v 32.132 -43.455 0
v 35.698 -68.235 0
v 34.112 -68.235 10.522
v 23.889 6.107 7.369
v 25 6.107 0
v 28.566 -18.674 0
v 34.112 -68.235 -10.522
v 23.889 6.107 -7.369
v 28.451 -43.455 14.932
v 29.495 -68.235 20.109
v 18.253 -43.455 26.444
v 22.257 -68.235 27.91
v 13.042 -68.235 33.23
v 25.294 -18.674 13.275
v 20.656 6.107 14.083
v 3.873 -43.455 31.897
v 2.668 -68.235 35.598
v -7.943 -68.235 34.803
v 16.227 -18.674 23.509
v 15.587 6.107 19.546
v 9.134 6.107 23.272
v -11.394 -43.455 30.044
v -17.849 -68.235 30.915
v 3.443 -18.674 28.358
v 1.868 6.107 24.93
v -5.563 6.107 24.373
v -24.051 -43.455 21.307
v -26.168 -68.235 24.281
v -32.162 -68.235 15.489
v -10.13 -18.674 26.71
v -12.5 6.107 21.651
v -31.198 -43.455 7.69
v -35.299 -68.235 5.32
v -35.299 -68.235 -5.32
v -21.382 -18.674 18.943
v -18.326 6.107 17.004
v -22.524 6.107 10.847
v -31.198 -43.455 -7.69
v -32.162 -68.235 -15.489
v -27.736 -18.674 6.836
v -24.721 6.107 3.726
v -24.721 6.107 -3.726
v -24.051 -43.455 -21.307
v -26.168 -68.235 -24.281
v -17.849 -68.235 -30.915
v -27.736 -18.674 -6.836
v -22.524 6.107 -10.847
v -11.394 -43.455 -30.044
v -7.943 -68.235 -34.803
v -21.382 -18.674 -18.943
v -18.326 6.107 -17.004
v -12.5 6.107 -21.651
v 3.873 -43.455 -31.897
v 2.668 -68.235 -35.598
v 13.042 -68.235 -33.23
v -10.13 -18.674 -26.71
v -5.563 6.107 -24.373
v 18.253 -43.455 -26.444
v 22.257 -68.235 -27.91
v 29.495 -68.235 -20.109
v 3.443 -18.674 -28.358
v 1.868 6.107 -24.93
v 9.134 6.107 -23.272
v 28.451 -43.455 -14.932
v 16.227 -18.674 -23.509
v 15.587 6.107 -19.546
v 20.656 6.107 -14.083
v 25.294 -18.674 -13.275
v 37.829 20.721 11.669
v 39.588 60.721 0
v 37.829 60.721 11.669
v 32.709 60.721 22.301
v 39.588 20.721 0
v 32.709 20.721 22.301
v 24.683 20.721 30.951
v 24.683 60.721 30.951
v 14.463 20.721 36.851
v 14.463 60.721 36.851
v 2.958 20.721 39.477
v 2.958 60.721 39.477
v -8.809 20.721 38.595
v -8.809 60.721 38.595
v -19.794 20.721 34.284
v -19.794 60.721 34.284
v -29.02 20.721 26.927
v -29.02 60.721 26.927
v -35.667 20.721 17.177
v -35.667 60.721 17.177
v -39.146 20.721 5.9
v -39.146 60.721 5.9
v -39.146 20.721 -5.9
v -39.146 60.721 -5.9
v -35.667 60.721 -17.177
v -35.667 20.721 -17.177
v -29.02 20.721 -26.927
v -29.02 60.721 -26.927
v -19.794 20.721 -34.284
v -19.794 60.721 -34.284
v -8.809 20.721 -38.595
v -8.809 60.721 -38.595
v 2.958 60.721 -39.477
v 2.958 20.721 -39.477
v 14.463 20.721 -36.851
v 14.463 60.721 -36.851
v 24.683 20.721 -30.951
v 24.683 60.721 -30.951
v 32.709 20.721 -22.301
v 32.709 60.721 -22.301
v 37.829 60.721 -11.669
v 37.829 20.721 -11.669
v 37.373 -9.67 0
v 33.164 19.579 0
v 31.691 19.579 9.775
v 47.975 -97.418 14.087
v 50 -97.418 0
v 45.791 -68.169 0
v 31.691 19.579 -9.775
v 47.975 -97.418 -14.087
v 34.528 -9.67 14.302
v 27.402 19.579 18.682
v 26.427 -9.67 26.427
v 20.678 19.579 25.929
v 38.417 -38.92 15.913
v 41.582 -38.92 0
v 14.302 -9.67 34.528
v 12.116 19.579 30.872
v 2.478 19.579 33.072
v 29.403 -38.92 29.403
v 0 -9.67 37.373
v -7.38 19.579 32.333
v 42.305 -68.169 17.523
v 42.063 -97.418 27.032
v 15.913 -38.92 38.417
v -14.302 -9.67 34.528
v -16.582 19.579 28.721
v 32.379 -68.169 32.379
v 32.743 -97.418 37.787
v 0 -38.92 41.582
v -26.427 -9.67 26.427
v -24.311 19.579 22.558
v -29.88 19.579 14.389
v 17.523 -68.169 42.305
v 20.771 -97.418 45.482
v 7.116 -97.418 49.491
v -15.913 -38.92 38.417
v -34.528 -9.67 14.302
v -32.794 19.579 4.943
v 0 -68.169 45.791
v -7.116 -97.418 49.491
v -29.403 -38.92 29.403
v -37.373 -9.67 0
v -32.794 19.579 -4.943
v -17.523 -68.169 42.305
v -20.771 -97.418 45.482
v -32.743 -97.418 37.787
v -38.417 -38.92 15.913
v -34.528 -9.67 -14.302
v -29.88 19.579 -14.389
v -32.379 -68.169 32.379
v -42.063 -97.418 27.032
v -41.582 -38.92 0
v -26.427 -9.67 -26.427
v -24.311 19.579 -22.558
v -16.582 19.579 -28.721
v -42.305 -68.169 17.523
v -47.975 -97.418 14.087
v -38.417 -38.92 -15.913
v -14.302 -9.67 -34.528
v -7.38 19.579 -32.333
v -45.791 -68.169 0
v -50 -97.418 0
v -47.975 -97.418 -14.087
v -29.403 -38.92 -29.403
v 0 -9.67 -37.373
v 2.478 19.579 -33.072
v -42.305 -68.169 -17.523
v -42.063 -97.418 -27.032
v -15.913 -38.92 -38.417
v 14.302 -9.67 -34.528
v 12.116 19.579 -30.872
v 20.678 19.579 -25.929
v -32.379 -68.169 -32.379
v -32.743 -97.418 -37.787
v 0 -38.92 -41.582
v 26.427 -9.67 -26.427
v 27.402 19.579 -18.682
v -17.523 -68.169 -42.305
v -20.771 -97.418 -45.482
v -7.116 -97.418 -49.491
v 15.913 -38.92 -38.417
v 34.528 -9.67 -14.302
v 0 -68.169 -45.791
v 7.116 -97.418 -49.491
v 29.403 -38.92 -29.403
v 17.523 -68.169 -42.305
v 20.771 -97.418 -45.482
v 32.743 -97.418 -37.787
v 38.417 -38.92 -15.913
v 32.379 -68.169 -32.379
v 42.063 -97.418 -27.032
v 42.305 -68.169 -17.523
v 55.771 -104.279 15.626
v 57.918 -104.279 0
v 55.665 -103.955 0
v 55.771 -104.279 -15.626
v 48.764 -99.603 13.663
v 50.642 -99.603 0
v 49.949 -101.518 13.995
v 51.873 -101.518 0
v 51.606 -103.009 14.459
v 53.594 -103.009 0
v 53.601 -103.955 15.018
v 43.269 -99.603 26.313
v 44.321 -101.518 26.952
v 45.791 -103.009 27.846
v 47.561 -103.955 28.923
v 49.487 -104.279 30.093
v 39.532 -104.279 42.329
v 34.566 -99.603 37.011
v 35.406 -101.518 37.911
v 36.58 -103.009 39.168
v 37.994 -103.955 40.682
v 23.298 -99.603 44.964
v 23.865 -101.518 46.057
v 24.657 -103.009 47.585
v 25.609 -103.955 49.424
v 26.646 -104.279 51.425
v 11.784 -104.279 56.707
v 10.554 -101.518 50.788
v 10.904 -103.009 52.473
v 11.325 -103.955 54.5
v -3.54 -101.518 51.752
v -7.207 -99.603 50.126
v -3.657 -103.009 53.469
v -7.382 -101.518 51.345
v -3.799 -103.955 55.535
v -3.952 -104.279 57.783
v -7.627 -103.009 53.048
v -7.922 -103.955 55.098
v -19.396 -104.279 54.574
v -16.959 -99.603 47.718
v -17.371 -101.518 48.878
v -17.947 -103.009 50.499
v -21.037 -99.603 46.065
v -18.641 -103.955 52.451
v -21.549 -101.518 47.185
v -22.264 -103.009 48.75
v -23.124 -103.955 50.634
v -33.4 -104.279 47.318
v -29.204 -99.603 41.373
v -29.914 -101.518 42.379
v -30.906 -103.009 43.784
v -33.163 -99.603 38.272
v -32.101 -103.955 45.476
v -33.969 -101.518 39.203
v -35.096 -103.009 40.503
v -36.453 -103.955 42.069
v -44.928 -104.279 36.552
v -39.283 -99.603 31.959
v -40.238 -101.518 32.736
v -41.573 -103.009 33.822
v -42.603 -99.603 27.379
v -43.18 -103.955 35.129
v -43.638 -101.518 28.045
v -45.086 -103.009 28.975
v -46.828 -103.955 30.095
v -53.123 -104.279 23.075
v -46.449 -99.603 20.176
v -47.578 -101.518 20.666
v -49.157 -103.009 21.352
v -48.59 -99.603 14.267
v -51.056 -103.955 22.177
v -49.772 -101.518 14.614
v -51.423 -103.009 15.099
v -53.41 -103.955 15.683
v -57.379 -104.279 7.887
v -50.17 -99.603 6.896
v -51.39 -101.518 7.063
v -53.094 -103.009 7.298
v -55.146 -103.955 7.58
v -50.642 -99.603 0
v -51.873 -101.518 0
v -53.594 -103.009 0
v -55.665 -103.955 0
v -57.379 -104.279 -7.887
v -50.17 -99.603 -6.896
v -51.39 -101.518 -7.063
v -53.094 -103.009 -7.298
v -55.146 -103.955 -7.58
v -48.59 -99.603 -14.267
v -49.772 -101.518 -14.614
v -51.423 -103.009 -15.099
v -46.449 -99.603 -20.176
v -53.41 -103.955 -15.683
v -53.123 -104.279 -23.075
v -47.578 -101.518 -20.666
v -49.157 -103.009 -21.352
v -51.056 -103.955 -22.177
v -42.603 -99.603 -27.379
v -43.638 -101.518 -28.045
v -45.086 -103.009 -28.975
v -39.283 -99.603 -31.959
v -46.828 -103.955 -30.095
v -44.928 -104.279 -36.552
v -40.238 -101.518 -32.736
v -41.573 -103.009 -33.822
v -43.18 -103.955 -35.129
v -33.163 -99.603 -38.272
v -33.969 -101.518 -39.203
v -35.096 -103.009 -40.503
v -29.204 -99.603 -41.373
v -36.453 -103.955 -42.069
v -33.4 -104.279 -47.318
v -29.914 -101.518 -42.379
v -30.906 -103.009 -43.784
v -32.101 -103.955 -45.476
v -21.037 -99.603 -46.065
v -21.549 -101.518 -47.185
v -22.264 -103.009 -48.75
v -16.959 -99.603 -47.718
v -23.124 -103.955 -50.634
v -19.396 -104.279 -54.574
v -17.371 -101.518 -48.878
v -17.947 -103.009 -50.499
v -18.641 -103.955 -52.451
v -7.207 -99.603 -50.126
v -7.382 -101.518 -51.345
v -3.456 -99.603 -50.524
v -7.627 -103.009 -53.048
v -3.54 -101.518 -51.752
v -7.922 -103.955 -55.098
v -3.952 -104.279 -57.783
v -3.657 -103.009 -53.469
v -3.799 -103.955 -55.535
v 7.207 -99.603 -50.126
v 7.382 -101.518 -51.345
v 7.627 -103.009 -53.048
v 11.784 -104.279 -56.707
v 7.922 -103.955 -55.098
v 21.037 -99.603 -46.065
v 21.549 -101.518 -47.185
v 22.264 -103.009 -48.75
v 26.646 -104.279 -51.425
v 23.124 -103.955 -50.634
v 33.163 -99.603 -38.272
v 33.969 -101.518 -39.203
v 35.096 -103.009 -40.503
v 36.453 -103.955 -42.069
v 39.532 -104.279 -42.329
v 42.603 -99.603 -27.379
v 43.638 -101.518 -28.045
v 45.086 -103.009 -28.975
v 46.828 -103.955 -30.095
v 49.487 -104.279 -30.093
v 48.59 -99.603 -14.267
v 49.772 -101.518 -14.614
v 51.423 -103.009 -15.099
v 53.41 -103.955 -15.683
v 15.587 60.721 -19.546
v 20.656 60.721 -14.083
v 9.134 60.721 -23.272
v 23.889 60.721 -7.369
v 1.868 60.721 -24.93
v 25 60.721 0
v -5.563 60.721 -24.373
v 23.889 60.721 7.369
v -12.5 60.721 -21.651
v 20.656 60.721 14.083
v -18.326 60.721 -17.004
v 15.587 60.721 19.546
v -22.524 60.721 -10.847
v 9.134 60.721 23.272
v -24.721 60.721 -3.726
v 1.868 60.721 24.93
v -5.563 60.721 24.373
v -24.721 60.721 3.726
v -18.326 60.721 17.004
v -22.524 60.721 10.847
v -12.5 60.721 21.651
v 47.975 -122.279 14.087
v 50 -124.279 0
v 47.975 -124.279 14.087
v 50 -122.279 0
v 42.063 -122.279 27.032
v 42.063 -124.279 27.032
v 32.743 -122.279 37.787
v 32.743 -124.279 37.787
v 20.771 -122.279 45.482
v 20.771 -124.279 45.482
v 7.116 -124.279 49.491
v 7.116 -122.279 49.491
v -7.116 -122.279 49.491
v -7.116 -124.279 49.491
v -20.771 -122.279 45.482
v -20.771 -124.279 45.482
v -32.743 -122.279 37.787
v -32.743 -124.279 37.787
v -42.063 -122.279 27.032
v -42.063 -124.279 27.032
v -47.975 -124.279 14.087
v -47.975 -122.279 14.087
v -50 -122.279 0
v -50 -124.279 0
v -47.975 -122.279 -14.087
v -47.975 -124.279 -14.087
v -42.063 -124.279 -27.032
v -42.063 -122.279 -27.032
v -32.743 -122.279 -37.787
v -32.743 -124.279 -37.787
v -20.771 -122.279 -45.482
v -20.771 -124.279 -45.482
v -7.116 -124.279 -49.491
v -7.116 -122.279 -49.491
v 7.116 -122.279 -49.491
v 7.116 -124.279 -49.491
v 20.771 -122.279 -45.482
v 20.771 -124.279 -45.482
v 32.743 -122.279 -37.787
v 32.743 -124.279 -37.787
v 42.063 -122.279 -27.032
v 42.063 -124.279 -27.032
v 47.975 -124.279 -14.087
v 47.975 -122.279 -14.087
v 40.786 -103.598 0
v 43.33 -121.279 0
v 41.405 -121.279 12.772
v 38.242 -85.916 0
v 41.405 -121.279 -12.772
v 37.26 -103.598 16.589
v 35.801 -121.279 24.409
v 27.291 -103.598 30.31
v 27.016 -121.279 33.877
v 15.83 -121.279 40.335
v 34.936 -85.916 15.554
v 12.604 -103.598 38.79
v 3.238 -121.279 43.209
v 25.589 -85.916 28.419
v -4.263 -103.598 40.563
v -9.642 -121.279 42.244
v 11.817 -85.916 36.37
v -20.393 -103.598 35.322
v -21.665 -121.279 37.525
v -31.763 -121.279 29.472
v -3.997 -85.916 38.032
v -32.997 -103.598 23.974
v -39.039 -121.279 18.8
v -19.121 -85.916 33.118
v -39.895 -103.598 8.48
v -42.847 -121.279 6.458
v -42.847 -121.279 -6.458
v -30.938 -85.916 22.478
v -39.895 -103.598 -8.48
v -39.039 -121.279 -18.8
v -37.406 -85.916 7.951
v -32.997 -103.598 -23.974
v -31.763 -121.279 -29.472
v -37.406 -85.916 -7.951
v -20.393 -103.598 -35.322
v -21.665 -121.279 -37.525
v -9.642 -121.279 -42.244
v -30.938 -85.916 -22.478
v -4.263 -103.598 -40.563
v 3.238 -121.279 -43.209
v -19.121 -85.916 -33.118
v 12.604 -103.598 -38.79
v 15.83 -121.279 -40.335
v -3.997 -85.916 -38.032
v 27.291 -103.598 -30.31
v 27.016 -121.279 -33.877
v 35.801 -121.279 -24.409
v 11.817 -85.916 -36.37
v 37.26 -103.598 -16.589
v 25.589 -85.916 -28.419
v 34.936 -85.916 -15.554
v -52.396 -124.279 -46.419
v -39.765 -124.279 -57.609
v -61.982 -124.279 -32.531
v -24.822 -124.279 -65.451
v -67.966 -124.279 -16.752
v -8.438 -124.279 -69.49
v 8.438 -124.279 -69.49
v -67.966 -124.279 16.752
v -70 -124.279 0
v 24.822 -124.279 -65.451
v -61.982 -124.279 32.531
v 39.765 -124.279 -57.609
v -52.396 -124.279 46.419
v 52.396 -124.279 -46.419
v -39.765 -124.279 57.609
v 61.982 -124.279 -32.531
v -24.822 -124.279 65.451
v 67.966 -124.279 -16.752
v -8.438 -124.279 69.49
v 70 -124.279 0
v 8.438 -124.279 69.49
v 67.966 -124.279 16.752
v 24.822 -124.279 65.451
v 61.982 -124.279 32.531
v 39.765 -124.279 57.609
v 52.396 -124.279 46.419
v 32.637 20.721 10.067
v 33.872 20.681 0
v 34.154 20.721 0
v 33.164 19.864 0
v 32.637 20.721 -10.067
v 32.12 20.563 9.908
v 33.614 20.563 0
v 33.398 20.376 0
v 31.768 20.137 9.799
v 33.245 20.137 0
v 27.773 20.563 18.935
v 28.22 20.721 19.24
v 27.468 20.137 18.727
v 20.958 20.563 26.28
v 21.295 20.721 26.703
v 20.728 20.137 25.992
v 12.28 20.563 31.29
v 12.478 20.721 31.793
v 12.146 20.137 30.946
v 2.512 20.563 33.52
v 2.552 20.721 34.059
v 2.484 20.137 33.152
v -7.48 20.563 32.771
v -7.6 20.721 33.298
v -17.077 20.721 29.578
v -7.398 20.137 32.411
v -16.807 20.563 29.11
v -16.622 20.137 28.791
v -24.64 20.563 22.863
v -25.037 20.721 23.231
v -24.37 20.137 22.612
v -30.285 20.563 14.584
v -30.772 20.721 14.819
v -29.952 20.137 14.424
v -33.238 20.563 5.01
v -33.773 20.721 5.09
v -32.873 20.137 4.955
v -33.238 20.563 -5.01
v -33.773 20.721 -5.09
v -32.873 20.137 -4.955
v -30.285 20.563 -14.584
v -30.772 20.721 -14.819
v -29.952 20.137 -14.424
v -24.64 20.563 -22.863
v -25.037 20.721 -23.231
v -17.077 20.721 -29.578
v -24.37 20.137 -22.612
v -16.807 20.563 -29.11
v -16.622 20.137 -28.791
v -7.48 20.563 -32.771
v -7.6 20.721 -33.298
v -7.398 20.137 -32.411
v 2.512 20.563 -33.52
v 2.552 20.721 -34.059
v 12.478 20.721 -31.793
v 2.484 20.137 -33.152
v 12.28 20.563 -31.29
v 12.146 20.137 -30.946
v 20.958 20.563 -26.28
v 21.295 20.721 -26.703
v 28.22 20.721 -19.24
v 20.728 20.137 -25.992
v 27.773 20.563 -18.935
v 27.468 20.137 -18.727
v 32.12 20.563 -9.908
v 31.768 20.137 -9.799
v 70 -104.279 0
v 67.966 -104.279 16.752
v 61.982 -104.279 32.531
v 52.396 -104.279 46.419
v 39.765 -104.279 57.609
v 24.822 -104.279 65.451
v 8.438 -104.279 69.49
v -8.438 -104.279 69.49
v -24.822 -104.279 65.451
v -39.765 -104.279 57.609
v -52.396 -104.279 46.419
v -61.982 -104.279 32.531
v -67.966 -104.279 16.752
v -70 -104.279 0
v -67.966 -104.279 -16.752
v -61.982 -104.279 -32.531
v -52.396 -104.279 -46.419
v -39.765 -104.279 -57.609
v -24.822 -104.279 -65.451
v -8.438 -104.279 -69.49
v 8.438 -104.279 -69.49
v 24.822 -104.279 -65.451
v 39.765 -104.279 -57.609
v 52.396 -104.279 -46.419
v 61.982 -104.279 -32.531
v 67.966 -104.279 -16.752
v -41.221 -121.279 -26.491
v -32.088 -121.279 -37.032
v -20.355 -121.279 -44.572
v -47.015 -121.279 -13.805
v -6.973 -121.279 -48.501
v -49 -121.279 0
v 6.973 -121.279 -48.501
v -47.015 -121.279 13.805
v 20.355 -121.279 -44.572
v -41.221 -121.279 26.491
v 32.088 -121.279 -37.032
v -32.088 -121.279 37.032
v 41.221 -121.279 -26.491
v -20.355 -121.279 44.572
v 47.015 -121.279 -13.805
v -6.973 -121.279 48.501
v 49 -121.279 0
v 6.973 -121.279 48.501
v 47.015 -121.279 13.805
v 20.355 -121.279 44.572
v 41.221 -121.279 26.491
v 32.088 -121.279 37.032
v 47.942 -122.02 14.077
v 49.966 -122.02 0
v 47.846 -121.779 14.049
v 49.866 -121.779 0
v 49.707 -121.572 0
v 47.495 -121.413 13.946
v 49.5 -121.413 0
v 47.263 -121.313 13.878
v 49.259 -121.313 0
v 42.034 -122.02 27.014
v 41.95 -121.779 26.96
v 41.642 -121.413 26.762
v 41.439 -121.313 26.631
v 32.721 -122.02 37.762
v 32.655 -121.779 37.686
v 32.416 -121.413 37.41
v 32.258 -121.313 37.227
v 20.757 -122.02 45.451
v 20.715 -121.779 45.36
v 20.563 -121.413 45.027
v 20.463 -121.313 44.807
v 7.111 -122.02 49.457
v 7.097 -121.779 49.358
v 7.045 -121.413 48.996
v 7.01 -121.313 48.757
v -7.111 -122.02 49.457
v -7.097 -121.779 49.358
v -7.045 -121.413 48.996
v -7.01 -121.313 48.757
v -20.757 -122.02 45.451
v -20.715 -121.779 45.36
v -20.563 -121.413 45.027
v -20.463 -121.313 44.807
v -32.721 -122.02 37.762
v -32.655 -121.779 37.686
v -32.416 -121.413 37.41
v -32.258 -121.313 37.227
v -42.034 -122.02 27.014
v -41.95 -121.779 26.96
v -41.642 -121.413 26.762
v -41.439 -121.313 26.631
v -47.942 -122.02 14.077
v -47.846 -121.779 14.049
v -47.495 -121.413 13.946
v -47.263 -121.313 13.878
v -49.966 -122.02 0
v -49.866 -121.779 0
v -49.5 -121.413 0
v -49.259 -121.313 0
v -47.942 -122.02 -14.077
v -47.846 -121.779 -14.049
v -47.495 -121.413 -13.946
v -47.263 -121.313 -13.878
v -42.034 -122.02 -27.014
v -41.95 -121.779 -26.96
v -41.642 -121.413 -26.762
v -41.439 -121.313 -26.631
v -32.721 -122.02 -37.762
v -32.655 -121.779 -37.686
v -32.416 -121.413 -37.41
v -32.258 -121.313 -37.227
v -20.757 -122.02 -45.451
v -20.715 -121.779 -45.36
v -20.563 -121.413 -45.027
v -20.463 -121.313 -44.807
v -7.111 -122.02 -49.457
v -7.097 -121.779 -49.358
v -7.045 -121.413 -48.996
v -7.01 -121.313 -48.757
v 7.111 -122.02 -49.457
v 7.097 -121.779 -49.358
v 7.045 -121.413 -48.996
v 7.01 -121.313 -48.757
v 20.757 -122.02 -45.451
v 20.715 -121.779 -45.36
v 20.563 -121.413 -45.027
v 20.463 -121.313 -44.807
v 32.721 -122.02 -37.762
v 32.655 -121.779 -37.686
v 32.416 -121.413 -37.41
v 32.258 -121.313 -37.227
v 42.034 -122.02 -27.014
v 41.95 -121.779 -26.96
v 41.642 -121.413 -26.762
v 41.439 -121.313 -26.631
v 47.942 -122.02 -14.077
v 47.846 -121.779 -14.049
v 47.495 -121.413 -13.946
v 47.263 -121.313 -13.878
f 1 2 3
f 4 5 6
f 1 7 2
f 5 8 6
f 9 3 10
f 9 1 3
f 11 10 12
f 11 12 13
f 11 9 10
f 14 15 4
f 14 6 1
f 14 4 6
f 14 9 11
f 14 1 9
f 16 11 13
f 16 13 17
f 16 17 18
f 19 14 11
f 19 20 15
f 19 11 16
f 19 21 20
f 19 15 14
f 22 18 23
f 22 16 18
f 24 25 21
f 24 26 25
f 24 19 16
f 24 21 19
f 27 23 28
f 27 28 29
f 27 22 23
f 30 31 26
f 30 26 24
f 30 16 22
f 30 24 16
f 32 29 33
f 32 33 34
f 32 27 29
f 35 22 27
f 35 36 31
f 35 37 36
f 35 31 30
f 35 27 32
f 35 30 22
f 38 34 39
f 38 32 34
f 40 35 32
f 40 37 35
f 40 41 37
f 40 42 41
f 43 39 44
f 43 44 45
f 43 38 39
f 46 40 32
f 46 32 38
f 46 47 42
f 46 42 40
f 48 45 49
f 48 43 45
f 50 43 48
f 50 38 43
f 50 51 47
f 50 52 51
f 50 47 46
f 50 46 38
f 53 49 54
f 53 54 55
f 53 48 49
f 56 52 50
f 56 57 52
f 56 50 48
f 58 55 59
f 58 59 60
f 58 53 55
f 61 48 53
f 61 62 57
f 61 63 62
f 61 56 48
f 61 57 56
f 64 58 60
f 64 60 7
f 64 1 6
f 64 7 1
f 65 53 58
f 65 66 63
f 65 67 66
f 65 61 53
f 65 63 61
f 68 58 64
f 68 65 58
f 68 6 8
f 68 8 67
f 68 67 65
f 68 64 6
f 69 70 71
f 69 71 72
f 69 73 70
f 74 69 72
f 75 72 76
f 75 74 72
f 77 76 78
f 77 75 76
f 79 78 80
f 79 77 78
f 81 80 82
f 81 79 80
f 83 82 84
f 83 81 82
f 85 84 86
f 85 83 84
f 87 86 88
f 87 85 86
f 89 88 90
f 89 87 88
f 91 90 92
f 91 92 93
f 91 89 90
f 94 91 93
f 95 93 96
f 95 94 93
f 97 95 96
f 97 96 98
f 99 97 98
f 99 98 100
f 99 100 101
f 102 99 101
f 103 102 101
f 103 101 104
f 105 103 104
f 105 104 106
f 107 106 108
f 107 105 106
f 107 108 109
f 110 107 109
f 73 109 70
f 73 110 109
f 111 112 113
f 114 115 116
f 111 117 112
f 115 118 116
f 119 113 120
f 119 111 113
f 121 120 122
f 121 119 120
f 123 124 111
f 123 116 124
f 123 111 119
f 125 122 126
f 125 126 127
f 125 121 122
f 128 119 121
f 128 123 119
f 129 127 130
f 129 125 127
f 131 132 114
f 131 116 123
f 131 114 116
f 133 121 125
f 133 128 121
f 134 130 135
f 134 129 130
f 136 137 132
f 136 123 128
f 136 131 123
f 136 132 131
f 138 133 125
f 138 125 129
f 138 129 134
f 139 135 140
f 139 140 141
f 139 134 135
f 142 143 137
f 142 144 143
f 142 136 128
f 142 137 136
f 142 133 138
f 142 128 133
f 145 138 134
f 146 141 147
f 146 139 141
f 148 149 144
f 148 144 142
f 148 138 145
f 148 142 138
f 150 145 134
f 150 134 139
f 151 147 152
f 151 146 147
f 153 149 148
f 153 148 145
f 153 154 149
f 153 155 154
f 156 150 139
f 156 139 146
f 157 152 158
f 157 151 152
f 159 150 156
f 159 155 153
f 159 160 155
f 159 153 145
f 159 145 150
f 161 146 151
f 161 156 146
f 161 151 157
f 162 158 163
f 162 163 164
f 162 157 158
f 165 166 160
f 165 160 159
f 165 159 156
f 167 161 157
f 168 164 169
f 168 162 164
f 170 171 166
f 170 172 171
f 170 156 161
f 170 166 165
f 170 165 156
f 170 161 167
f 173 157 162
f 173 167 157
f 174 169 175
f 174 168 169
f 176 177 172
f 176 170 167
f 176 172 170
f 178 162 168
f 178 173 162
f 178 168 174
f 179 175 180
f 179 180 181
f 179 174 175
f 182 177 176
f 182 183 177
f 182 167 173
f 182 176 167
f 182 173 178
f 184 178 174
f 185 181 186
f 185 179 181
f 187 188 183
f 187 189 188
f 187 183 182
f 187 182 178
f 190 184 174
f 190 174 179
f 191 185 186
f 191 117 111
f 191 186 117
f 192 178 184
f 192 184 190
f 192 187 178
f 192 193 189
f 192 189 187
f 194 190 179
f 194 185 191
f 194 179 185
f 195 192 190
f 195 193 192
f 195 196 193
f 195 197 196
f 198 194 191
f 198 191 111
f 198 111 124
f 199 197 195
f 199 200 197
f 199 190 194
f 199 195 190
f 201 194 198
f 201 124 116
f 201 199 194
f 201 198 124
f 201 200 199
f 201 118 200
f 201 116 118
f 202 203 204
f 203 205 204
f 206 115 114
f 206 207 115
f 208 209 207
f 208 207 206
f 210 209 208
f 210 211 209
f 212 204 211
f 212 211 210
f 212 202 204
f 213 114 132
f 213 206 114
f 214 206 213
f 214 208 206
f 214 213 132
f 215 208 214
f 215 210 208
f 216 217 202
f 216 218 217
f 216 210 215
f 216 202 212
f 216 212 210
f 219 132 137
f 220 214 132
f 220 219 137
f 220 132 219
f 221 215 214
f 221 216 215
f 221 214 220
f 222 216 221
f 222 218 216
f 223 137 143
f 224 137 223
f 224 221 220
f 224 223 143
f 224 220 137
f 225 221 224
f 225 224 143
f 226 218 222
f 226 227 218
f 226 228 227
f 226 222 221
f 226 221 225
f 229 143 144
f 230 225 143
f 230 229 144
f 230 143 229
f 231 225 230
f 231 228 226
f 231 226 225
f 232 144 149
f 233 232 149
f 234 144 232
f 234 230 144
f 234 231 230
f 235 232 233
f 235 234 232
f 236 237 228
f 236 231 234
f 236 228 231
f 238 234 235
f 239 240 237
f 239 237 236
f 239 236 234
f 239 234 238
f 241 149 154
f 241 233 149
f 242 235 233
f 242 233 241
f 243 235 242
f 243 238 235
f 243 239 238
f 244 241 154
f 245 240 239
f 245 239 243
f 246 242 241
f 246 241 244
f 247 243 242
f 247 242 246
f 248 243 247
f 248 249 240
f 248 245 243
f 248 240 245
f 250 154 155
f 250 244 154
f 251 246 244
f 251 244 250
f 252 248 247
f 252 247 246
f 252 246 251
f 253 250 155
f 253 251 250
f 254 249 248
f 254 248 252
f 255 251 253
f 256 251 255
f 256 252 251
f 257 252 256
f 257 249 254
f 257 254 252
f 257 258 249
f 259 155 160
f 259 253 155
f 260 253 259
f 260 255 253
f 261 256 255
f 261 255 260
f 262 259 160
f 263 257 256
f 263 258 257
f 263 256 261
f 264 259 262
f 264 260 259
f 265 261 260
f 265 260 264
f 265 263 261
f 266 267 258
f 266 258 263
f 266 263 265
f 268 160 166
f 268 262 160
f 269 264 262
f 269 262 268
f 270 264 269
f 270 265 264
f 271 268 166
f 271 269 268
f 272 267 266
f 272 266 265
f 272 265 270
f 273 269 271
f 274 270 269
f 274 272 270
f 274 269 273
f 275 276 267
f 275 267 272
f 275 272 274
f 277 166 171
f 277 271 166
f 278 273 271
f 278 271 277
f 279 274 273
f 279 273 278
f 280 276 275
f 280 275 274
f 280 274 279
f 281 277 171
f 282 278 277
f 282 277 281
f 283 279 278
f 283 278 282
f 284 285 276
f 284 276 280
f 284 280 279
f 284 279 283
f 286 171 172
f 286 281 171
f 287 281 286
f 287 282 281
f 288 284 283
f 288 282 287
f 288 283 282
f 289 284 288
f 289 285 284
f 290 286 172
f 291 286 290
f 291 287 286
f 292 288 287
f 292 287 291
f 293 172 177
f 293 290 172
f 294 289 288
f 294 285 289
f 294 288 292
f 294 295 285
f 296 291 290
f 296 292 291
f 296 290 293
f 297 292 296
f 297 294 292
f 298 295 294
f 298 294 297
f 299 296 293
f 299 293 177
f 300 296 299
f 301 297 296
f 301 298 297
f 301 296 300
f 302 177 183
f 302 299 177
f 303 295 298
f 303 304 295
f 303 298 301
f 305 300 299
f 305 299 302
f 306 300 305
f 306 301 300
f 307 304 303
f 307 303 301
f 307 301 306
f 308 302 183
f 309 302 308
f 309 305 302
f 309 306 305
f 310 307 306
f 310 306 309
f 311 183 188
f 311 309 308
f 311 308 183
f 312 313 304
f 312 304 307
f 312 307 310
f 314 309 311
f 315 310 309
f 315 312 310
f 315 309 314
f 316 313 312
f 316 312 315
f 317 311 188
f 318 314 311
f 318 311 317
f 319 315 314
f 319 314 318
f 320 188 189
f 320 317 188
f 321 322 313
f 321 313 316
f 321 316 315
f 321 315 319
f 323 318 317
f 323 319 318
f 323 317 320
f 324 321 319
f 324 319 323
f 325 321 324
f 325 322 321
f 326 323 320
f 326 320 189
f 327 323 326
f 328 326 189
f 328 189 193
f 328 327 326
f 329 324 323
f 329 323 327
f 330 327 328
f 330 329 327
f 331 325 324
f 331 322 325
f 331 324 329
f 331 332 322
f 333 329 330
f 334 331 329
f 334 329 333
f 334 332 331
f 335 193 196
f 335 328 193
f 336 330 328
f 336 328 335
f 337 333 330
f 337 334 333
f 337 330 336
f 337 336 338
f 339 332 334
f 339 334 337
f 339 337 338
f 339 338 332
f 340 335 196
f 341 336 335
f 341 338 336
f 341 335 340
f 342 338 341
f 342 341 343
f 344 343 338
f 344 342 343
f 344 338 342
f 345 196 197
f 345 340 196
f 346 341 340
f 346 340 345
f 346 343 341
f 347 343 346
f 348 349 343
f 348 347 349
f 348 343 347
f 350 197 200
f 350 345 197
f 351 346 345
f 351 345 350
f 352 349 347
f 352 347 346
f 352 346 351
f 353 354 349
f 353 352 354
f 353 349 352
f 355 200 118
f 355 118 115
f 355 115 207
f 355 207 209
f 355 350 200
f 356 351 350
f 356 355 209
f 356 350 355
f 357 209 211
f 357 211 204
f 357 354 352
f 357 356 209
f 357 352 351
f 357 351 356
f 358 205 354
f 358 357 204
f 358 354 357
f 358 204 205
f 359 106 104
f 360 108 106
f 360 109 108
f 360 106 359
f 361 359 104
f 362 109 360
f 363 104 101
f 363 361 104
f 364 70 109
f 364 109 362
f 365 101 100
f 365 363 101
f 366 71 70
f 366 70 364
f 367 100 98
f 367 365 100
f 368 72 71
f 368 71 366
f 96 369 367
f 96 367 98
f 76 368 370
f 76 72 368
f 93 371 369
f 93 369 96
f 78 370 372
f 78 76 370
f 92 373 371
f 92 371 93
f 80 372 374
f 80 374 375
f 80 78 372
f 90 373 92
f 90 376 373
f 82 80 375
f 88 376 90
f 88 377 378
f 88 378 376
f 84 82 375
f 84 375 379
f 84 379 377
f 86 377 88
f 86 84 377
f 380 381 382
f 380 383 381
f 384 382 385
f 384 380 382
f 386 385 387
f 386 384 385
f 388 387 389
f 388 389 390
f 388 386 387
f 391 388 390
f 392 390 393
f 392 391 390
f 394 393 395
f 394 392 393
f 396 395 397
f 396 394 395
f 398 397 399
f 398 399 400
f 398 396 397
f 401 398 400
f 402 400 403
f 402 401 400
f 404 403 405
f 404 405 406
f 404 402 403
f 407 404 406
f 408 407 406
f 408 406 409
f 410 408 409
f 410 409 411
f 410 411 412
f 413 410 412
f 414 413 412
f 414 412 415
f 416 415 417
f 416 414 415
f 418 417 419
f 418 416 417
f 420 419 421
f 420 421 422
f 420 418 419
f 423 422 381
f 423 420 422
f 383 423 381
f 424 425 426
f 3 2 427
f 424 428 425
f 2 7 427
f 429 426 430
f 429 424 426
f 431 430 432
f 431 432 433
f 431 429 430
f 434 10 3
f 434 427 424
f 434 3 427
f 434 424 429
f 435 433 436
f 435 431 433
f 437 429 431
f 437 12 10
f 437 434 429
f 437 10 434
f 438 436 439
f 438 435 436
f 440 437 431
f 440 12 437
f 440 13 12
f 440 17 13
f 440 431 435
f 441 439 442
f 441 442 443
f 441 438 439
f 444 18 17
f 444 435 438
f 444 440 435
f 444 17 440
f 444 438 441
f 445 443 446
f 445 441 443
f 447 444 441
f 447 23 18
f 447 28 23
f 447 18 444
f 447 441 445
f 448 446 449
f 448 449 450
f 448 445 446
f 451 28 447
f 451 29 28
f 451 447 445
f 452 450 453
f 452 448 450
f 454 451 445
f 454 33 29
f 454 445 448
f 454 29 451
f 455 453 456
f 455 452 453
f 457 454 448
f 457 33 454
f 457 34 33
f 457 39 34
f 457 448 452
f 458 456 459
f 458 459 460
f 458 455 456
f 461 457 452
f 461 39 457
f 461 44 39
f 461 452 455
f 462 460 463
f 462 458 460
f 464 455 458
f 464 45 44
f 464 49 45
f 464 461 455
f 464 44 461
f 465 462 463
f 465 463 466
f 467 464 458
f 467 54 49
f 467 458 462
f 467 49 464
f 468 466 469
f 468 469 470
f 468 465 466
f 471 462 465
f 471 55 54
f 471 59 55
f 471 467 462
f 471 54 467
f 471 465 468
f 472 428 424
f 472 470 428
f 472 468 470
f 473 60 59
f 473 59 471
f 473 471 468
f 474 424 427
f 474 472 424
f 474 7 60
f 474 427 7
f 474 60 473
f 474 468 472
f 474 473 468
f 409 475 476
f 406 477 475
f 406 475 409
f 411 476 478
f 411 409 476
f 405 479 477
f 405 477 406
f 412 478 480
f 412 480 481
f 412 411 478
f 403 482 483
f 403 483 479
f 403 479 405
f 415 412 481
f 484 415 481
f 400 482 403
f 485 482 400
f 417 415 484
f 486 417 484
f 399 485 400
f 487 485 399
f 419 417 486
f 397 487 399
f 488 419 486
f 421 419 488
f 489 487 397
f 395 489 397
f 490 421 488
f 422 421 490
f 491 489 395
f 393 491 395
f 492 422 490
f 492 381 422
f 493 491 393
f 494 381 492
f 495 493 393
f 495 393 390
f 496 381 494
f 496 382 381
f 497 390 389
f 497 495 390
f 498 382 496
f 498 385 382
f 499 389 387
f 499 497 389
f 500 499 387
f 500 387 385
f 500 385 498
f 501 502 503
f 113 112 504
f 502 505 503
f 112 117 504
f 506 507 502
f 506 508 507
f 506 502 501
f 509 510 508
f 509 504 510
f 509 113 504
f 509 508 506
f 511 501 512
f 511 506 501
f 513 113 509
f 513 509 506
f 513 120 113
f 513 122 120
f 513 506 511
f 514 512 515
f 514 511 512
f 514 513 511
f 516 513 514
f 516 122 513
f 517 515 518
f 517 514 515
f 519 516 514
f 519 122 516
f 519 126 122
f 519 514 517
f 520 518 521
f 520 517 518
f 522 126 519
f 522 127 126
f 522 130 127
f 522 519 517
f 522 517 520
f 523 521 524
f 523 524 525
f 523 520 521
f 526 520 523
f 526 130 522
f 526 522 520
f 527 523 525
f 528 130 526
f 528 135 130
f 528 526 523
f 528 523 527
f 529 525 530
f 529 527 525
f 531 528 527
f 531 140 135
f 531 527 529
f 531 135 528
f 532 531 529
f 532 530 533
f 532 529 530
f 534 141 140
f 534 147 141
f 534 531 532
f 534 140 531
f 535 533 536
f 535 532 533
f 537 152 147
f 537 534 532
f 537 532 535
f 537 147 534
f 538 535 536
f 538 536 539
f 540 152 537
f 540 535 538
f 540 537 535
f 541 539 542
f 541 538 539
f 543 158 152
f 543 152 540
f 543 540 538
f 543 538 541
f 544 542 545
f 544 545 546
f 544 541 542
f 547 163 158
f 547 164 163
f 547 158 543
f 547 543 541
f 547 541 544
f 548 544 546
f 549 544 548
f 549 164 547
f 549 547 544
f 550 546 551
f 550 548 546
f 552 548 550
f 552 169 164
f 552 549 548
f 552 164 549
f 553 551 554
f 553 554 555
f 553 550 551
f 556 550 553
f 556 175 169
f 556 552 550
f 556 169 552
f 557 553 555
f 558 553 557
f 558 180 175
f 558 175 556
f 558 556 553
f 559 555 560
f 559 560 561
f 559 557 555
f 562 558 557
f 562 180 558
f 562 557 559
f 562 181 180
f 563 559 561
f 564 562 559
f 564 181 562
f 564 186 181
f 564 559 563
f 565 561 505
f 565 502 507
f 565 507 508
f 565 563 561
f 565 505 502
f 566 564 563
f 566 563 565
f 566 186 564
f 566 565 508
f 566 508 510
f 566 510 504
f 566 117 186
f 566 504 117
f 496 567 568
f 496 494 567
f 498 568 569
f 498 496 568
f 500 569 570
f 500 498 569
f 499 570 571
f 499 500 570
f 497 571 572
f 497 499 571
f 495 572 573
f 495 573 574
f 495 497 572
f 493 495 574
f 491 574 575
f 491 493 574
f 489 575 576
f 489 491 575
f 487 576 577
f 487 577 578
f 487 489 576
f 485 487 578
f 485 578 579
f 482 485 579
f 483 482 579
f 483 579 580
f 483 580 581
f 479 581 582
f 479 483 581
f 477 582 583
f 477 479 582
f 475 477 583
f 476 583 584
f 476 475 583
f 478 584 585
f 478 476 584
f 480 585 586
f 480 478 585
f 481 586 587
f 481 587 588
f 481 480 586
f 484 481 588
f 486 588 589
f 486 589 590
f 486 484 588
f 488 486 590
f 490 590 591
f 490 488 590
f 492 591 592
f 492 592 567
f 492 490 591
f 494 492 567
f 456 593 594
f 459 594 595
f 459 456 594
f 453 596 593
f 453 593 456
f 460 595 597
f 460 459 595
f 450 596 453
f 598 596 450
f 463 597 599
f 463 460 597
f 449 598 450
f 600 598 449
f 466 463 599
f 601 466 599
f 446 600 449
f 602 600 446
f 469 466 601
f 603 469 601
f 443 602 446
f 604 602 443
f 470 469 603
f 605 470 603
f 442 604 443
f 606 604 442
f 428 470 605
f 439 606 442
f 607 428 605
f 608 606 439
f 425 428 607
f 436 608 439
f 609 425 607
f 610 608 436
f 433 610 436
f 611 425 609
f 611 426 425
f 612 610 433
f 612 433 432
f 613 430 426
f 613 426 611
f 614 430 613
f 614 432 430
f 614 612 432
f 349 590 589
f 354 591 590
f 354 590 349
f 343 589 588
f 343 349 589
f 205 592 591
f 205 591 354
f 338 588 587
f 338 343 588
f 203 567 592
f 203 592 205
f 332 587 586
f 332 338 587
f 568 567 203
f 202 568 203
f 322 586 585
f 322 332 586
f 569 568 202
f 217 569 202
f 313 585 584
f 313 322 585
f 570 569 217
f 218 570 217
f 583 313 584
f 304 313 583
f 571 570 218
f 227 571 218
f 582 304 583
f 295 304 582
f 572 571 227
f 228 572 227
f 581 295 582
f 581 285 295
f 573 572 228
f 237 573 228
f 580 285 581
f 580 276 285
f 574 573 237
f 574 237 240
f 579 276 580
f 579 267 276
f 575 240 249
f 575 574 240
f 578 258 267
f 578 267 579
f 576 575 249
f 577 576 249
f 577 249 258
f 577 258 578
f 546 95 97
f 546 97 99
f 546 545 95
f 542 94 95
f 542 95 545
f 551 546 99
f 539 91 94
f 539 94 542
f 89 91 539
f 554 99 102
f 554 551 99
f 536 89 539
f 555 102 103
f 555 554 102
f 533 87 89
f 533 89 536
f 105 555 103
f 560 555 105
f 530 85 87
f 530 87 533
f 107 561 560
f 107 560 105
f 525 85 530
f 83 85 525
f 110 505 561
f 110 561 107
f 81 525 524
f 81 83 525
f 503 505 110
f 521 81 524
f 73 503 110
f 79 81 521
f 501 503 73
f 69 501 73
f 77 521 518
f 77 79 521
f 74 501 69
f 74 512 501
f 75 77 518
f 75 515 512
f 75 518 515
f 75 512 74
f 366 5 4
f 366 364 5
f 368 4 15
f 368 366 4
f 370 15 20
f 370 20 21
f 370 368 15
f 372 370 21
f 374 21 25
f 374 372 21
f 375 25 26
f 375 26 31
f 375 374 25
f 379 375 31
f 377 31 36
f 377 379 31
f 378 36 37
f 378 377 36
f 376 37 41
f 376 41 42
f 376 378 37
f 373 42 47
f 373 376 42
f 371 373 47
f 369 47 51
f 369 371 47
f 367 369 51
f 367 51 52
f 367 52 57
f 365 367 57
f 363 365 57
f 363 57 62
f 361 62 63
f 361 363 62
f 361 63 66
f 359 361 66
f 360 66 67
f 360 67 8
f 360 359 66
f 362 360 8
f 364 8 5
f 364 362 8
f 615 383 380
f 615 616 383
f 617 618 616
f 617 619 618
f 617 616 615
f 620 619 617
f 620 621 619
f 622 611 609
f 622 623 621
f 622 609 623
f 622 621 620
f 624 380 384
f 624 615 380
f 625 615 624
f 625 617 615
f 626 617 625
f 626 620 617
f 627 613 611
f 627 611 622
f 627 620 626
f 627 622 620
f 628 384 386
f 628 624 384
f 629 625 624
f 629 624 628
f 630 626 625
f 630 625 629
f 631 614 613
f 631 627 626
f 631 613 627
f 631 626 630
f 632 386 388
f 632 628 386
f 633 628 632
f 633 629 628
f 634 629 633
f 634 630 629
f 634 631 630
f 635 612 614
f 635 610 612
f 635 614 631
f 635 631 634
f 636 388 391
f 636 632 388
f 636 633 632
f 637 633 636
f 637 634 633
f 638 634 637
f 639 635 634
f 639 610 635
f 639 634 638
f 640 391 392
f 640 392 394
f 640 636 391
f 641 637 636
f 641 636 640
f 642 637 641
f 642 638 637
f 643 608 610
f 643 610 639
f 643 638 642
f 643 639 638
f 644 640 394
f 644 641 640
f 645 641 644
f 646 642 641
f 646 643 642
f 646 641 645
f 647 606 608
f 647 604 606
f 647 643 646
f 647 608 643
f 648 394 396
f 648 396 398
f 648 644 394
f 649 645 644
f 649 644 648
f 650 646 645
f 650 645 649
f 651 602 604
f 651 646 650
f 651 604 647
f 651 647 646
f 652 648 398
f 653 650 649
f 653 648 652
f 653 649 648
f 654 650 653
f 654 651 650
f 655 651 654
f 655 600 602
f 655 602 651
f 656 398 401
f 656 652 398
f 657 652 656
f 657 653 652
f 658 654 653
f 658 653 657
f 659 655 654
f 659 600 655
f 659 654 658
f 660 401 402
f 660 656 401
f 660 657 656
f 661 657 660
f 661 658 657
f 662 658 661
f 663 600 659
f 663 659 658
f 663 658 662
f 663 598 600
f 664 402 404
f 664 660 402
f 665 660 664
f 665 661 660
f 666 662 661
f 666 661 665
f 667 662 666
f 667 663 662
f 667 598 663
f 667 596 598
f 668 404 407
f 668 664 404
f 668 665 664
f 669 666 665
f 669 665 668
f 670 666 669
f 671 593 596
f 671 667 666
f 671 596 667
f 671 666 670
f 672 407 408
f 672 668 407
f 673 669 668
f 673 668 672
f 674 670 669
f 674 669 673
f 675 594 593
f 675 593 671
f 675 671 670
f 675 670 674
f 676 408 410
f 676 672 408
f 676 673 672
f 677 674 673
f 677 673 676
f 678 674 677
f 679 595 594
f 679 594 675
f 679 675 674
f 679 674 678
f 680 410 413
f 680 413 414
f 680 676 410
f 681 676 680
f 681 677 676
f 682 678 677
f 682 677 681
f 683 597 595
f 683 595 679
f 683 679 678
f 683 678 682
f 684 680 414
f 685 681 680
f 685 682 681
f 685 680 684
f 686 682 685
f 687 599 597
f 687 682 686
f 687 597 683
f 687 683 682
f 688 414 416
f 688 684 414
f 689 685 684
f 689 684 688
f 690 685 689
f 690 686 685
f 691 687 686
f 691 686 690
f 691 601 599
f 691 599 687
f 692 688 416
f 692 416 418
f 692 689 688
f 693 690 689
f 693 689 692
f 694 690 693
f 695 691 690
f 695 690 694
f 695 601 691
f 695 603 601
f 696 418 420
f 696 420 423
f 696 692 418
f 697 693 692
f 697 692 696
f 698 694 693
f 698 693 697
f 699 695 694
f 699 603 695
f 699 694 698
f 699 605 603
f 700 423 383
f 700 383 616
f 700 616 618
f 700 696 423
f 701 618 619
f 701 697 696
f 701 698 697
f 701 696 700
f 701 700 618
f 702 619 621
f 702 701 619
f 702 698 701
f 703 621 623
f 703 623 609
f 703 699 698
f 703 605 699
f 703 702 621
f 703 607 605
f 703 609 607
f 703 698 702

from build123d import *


with BuildPart() as part:
    # Sketch1 → Revolve1 (revolve)
    with BuildSketch(Plane.XY):
        with BuildLine():
            Line((39.587859575, 60.721319219), (39.587859575, 20.721319219))
            Line((39.587859575, 20.721319219), (34.15419798, 20.721319219))
            ThreePointArc((34.15419798, 20.721319219), (33.398410087, 20.376135729), (33.1643932, 19.578888541))
            Line((33.1643932, 19.578888541), (50, -97.418126201))
            ThreePointArc((50, -97.418126201), (52.679906162, -102.324983923), (57.918438238, -104.278680781))
            Line((57.918438238, -104.278680781), (70, -104.278680781))
            Line((70, -104.278680781), (70, -124.278680781))
            Line((70, -124.278680781), (50, -124.278680781))
            Line((50, -124.278680781), (50, -122.278680781))
            ThreePointArc((50, -122.278680781), (49.707106781, -121.571574), (49, -121.278680781))
            Line((49, -121.278680781), (43.330477707, -121.278680781))
            Line((43.330477707, -121.278680781), (35.697641886, -68.23521073))
            Line((35.697641886, -68.23521073), (25, 6.106758666))
            Line((25, 6.106758666), (25, 60.721319219))
            Line((25, 60.721319219), (39.587859575, 60.721319219))
        make_face()
    revolve(axis=Axis((0, 76.173744253, 0), (0, -1, 0)))


solid = part.part
